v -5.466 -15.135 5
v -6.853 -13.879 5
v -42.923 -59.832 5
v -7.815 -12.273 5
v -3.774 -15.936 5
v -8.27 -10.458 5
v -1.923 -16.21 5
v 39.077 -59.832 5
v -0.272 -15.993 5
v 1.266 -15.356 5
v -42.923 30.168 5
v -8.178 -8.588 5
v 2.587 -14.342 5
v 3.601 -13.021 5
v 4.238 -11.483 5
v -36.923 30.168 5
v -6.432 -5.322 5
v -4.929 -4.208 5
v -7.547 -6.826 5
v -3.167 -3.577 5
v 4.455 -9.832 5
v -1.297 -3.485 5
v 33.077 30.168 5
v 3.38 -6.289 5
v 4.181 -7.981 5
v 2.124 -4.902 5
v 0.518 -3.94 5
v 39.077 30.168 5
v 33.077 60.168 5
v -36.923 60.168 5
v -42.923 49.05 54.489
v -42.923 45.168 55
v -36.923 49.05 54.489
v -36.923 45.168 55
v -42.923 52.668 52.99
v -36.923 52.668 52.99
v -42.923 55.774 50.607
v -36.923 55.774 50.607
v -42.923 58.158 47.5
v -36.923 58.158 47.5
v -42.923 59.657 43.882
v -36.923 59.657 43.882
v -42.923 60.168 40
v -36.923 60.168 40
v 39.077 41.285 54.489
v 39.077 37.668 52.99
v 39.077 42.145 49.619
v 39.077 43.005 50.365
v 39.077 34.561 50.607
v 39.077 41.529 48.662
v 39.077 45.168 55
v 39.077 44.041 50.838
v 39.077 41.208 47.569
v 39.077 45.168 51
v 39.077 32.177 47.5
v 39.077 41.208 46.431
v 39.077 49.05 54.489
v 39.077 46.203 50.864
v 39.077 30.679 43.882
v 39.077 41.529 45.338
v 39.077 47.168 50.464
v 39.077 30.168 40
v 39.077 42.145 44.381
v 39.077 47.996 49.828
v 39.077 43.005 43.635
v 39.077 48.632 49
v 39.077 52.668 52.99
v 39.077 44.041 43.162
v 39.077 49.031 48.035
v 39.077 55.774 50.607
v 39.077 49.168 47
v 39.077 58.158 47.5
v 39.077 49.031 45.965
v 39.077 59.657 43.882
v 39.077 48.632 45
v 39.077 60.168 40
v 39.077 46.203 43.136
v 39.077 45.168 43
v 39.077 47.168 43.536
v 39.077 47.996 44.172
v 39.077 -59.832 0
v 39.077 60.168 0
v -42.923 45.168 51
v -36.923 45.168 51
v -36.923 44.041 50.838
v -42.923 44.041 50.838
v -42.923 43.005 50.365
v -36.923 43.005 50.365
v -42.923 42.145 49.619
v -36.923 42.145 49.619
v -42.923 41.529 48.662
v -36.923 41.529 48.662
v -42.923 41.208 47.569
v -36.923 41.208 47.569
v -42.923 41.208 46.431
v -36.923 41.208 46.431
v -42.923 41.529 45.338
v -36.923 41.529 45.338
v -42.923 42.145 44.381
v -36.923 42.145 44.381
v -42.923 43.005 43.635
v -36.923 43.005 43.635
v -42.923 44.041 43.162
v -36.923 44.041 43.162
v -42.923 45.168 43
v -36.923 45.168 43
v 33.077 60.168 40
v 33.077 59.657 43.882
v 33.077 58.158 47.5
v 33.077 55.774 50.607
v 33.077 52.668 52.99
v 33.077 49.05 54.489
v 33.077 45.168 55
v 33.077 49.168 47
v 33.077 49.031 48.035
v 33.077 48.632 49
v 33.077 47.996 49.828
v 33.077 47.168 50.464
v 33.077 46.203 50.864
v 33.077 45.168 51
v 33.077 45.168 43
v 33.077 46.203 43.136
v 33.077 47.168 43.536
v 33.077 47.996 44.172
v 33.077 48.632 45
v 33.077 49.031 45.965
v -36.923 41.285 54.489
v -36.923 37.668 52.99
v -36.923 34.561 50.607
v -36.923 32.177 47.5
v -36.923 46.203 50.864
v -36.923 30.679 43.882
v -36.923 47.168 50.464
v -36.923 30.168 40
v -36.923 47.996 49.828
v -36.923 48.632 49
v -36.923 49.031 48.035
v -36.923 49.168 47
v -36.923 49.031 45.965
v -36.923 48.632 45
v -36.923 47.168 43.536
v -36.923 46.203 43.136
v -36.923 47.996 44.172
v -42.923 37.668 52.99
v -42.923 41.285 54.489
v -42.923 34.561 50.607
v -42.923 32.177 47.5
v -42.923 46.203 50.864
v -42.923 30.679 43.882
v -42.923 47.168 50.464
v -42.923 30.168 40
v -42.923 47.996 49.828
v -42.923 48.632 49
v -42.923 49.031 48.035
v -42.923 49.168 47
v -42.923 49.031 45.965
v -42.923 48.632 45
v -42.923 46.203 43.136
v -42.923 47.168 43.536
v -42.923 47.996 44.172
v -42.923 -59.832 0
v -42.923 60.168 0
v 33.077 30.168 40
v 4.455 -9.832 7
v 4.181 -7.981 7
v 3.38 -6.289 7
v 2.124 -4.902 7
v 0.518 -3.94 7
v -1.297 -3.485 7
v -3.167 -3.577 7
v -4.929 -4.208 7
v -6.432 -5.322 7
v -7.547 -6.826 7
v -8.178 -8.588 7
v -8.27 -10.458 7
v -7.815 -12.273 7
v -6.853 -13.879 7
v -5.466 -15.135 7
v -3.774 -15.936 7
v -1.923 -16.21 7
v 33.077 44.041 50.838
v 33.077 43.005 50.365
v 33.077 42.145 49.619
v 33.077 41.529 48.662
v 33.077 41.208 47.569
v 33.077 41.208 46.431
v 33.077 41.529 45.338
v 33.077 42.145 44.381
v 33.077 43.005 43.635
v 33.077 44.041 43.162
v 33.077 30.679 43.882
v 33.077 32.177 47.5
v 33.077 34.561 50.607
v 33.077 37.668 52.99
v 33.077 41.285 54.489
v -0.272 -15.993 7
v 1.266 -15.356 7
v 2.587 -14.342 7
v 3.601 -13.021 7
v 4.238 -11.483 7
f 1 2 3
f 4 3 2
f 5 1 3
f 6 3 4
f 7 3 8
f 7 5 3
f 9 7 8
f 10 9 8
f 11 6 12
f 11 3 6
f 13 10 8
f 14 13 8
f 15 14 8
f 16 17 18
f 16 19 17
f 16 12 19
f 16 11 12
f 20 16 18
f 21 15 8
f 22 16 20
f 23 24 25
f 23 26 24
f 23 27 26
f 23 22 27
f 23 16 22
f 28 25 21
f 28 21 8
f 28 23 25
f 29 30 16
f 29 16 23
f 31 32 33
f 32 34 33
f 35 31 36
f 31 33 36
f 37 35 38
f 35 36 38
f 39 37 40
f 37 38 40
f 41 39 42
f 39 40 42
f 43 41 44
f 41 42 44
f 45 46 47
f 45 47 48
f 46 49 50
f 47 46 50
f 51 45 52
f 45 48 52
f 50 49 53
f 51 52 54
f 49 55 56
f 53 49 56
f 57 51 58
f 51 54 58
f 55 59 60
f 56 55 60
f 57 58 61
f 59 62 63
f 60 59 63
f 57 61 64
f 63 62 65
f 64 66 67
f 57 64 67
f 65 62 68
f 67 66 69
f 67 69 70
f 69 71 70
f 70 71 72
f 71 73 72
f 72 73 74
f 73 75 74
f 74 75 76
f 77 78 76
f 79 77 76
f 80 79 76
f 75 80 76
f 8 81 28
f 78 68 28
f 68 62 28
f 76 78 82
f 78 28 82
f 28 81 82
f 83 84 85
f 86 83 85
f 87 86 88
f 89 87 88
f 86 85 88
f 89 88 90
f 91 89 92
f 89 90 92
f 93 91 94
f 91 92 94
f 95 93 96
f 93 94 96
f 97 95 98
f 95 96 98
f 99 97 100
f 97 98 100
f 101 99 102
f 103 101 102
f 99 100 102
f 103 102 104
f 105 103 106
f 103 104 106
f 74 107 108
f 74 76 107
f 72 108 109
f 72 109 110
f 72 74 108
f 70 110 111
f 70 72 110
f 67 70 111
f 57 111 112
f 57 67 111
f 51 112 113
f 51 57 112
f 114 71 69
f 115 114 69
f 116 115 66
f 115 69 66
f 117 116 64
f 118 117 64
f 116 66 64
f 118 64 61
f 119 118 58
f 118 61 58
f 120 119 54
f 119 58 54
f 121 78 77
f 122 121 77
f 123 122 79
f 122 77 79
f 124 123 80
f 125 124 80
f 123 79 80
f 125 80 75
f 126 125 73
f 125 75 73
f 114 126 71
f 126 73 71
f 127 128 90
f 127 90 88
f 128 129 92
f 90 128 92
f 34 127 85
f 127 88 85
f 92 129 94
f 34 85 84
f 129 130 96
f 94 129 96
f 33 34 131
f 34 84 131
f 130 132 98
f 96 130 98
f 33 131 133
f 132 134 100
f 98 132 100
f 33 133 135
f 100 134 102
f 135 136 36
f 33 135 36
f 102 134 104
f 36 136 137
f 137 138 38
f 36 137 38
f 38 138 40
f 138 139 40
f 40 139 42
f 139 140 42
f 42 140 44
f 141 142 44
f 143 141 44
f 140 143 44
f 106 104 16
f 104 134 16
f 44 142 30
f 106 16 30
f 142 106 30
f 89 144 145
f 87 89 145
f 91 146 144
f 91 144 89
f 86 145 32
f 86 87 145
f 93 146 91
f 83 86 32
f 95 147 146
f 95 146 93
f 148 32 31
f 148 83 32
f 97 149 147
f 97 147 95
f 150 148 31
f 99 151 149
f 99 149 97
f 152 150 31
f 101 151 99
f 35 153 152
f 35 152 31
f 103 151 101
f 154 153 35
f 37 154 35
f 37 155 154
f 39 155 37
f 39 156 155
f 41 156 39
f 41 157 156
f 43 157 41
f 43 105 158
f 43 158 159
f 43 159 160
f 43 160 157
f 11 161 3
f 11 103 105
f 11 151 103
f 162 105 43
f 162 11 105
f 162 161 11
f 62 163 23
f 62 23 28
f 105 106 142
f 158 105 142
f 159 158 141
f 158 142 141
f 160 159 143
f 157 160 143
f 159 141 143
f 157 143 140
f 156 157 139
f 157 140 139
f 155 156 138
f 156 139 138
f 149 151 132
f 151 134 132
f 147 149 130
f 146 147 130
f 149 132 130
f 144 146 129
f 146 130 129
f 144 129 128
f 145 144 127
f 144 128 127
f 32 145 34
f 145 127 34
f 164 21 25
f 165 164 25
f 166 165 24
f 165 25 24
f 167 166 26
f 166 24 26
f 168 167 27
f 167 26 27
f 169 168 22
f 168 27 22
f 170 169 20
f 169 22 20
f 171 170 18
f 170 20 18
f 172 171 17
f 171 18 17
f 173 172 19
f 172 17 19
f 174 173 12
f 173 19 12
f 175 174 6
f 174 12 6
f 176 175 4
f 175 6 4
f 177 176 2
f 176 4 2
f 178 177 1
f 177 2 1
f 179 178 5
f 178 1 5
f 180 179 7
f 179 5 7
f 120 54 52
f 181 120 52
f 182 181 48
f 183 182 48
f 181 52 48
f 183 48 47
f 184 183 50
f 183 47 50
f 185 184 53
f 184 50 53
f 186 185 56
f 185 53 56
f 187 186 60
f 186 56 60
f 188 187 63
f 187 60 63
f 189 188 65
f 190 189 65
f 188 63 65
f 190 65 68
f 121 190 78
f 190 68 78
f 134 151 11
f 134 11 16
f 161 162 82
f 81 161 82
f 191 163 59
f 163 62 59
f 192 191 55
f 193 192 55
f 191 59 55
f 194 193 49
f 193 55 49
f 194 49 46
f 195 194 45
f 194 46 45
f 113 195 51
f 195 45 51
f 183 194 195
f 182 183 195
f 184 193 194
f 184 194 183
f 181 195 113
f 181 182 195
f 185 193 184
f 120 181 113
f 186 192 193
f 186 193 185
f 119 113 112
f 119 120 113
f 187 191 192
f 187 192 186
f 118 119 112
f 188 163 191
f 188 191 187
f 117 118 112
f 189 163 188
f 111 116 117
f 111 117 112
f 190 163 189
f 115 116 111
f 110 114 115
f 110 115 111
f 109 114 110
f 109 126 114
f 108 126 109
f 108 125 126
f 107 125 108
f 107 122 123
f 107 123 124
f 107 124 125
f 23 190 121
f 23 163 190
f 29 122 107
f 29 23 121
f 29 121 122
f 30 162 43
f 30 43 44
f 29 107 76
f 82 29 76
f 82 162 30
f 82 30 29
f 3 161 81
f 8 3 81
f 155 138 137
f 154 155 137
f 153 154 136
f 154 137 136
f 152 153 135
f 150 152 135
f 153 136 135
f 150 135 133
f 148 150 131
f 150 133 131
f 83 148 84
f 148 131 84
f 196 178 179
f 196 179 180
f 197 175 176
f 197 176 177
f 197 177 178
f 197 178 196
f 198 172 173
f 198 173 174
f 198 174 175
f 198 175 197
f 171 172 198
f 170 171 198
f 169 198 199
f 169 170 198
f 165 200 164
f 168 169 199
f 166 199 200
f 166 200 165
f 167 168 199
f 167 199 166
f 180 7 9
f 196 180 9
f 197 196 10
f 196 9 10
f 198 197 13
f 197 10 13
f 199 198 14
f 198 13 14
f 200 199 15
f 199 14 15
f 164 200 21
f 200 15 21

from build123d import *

# Parameters (mm, degrees)
F0_W     = 82
F0_H     = 120
F1_DEPTH = 5
F3_DEPTH = 2
F4_W     = 6
F4_H     = 30
F5_DEPTH = 50
F7_DEPTH = 82.001
F8_R     = 14.99999


# Not quite as in the source:
# - a fillet or chamfer is up to 0.001 mm smaller than in the source, because OpenCascade refuses the exact size


with BuildPart() as f1:
    # F0 (on Top) → F1 (new body)
    with BuildSketch(Plane.XY):
        with Locations((-1.9225833714, 0.167620076)):
            Rectangle(F0_W, F0_H)
    extrude(amount=F1_DEPTH)

    # F2 (on face) → F3 (join)
    with BuildSketch(Plane.XY.offset(5)):
        with BuildLine():
            ThreePointArc((-1.9225833714, -16.2103295776), (2.5873080787, -14.3422713741), (4.4553662822, -9.832379924))
            ThreePointArc((4.4553662822, -9.832379924), (-6.4324748215, -5.3224884739), (-1.9225833714, -16.2103295776))
        make_face()
    extrude(amount=F3_DEPTH)

    # F4 (on face) → F5 (join)
    with BuildSketch(Plane.XY.offset(5)):
        with Locations((-39.9225833714, 45.167620076)):
            Rectangle(F4_W, F4_H)
        with Locations((36.0774166286, 45.167620076)):
            Rectangle(F4_W, F4_H)
    extrude(amount=F5_DEPTH)

    # F6 (on face) → F7 (cut, through all)
    with BuildSketch(Plane.YZ.offset(39.0774166286)):
        with BuildLine():
            Line((45.167620076, 43), (45.167620076, 51))
            ThreePointArc((45.167620076, 51), (41.167620076, 47), (45.167620076, 43))
        make_face()
        with BuildLine():
            ThreePointArc((45.167620076, 43), (47.9960472007, 44.1715728753), (49.167620076, 47))
            ThreePointArc((49.167620076, 47), (47.9960472007, 49.8284271247), (45.167620076, 51))
            Line((45.167620076, 51), (45.167620076, 43))
        make_face()
    extrude(amount=-F7_DEPTH, mode=Mode.SUBTRACT)

    # F8 (radius 15 in the source; OpenCascade refuses exactly that, so slightly less here)
    f8_edges = [f1.edges().sort_by_distance(p)[0] for p in [
        (36.077417, 30.16762, 55),
        (-39.922583, 30.16762, 55),
        (-39.922583, 60.16762, 55),
        (36.077417, 60.16762, 55),
    ]]
    fillet(f8_edges, radius=F8_R)


solid = f1.part
